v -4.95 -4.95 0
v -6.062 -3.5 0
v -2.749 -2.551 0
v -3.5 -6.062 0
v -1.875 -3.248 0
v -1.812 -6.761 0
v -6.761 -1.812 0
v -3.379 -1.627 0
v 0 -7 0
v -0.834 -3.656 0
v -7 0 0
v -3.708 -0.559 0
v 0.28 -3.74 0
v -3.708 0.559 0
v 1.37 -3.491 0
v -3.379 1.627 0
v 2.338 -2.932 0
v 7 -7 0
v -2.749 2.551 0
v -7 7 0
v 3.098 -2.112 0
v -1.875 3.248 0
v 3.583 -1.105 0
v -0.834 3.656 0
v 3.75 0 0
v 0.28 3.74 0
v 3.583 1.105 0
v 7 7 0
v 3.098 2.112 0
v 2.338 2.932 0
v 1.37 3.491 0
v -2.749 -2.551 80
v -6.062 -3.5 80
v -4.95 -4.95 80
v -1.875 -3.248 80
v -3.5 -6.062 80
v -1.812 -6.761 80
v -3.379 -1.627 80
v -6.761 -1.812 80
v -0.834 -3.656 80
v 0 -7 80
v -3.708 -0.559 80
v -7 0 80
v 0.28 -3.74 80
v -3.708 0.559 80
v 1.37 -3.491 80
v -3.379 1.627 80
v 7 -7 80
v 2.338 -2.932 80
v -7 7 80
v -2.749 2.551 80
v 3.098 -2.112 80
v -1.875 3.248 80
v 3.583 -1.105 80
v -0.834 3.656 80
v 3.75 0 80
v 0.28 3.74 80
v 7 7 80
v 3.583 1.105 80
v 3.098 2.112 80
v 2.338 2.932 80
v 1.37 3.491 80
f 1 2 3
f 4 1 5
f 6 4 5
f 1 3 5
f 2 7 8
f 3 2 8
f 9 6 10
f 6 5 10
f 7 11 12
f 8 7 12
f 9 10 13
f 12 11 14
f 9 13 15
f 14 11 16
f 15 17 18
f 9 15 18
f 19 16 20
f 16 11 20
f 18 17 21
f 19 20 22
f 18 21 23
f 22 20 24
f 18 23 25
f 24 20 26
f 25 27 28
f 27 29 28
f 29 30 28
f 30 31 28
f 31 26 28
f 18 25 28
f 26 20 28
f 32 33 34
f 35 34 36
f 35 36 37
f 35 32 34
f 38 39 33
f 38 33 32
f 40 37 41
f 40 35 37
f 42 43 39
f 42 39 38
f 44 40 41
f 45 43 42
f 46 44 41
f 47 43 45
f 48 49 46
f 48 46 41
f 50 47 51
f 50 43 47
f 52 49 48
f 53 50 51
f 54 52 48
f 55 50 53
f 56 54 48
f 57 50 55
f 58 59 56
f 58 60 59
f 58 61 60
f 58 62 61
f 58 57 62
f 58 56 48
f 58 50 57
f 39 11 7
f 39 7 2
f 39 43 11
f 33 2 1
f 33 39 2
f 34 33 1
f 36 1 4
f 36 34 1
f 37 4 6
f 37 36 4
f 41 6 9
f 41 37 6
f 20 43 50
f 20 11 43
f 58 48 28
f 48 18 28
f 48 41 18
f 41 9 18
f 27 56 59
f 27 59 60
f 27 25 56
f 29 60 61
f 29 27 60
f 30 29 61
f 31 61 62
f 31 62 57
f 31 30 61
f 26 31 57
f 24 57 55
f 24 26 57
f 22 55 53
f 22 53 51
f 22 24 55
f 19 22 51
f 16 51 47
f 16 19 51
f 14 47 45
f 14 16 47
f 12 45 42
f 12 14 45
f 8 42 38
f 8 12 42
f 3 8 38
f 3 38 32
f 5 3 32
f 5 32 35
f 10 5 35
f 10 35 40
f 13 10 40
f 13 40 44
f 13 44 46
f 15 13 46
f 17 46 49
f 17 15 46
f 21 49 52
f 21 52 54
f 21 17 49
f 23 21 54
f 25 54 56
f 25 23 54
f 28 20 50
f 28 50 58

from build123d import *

# Parameters (mm, degrees)
F0_W      = 14
F0_H      = 14
F0_R      = 3.75
F1_DEPTH  = 70
F1_FACE_W = 14
F1_FACE_H = 14
F1_FACE_R = 3.75
F2_DEPTH  = 10
F3_R      = 7


with BuildPart() as f1:
    # F0 (on Top) → F1 (new body)
    with BuildSketch(Plane.XY):
        Rectangle(F0_W, F0_H)
        Circle(F0_R, mode=Mode.SUBTRACT)
    extrude(amount=F1_DEPTH)

    # F1_face (on face) → F2 (join)
    with BuildSketch(Plane.XY.offset(70)):
        Rectangle(F1_FACE_W, F1_FACE_H)
        Circle(F1_FACE_R, mode=Mode.SUBTRACT)
    extrude(amount=F2_DEPTH)

    # F3
    f3_edges = [f1.edges().sort_by_distance(p)[0] for p in [
        (-7, -7, 40),
    ]]
    fillet(f3_edges, radius=F3_R)


solid = f1.part
